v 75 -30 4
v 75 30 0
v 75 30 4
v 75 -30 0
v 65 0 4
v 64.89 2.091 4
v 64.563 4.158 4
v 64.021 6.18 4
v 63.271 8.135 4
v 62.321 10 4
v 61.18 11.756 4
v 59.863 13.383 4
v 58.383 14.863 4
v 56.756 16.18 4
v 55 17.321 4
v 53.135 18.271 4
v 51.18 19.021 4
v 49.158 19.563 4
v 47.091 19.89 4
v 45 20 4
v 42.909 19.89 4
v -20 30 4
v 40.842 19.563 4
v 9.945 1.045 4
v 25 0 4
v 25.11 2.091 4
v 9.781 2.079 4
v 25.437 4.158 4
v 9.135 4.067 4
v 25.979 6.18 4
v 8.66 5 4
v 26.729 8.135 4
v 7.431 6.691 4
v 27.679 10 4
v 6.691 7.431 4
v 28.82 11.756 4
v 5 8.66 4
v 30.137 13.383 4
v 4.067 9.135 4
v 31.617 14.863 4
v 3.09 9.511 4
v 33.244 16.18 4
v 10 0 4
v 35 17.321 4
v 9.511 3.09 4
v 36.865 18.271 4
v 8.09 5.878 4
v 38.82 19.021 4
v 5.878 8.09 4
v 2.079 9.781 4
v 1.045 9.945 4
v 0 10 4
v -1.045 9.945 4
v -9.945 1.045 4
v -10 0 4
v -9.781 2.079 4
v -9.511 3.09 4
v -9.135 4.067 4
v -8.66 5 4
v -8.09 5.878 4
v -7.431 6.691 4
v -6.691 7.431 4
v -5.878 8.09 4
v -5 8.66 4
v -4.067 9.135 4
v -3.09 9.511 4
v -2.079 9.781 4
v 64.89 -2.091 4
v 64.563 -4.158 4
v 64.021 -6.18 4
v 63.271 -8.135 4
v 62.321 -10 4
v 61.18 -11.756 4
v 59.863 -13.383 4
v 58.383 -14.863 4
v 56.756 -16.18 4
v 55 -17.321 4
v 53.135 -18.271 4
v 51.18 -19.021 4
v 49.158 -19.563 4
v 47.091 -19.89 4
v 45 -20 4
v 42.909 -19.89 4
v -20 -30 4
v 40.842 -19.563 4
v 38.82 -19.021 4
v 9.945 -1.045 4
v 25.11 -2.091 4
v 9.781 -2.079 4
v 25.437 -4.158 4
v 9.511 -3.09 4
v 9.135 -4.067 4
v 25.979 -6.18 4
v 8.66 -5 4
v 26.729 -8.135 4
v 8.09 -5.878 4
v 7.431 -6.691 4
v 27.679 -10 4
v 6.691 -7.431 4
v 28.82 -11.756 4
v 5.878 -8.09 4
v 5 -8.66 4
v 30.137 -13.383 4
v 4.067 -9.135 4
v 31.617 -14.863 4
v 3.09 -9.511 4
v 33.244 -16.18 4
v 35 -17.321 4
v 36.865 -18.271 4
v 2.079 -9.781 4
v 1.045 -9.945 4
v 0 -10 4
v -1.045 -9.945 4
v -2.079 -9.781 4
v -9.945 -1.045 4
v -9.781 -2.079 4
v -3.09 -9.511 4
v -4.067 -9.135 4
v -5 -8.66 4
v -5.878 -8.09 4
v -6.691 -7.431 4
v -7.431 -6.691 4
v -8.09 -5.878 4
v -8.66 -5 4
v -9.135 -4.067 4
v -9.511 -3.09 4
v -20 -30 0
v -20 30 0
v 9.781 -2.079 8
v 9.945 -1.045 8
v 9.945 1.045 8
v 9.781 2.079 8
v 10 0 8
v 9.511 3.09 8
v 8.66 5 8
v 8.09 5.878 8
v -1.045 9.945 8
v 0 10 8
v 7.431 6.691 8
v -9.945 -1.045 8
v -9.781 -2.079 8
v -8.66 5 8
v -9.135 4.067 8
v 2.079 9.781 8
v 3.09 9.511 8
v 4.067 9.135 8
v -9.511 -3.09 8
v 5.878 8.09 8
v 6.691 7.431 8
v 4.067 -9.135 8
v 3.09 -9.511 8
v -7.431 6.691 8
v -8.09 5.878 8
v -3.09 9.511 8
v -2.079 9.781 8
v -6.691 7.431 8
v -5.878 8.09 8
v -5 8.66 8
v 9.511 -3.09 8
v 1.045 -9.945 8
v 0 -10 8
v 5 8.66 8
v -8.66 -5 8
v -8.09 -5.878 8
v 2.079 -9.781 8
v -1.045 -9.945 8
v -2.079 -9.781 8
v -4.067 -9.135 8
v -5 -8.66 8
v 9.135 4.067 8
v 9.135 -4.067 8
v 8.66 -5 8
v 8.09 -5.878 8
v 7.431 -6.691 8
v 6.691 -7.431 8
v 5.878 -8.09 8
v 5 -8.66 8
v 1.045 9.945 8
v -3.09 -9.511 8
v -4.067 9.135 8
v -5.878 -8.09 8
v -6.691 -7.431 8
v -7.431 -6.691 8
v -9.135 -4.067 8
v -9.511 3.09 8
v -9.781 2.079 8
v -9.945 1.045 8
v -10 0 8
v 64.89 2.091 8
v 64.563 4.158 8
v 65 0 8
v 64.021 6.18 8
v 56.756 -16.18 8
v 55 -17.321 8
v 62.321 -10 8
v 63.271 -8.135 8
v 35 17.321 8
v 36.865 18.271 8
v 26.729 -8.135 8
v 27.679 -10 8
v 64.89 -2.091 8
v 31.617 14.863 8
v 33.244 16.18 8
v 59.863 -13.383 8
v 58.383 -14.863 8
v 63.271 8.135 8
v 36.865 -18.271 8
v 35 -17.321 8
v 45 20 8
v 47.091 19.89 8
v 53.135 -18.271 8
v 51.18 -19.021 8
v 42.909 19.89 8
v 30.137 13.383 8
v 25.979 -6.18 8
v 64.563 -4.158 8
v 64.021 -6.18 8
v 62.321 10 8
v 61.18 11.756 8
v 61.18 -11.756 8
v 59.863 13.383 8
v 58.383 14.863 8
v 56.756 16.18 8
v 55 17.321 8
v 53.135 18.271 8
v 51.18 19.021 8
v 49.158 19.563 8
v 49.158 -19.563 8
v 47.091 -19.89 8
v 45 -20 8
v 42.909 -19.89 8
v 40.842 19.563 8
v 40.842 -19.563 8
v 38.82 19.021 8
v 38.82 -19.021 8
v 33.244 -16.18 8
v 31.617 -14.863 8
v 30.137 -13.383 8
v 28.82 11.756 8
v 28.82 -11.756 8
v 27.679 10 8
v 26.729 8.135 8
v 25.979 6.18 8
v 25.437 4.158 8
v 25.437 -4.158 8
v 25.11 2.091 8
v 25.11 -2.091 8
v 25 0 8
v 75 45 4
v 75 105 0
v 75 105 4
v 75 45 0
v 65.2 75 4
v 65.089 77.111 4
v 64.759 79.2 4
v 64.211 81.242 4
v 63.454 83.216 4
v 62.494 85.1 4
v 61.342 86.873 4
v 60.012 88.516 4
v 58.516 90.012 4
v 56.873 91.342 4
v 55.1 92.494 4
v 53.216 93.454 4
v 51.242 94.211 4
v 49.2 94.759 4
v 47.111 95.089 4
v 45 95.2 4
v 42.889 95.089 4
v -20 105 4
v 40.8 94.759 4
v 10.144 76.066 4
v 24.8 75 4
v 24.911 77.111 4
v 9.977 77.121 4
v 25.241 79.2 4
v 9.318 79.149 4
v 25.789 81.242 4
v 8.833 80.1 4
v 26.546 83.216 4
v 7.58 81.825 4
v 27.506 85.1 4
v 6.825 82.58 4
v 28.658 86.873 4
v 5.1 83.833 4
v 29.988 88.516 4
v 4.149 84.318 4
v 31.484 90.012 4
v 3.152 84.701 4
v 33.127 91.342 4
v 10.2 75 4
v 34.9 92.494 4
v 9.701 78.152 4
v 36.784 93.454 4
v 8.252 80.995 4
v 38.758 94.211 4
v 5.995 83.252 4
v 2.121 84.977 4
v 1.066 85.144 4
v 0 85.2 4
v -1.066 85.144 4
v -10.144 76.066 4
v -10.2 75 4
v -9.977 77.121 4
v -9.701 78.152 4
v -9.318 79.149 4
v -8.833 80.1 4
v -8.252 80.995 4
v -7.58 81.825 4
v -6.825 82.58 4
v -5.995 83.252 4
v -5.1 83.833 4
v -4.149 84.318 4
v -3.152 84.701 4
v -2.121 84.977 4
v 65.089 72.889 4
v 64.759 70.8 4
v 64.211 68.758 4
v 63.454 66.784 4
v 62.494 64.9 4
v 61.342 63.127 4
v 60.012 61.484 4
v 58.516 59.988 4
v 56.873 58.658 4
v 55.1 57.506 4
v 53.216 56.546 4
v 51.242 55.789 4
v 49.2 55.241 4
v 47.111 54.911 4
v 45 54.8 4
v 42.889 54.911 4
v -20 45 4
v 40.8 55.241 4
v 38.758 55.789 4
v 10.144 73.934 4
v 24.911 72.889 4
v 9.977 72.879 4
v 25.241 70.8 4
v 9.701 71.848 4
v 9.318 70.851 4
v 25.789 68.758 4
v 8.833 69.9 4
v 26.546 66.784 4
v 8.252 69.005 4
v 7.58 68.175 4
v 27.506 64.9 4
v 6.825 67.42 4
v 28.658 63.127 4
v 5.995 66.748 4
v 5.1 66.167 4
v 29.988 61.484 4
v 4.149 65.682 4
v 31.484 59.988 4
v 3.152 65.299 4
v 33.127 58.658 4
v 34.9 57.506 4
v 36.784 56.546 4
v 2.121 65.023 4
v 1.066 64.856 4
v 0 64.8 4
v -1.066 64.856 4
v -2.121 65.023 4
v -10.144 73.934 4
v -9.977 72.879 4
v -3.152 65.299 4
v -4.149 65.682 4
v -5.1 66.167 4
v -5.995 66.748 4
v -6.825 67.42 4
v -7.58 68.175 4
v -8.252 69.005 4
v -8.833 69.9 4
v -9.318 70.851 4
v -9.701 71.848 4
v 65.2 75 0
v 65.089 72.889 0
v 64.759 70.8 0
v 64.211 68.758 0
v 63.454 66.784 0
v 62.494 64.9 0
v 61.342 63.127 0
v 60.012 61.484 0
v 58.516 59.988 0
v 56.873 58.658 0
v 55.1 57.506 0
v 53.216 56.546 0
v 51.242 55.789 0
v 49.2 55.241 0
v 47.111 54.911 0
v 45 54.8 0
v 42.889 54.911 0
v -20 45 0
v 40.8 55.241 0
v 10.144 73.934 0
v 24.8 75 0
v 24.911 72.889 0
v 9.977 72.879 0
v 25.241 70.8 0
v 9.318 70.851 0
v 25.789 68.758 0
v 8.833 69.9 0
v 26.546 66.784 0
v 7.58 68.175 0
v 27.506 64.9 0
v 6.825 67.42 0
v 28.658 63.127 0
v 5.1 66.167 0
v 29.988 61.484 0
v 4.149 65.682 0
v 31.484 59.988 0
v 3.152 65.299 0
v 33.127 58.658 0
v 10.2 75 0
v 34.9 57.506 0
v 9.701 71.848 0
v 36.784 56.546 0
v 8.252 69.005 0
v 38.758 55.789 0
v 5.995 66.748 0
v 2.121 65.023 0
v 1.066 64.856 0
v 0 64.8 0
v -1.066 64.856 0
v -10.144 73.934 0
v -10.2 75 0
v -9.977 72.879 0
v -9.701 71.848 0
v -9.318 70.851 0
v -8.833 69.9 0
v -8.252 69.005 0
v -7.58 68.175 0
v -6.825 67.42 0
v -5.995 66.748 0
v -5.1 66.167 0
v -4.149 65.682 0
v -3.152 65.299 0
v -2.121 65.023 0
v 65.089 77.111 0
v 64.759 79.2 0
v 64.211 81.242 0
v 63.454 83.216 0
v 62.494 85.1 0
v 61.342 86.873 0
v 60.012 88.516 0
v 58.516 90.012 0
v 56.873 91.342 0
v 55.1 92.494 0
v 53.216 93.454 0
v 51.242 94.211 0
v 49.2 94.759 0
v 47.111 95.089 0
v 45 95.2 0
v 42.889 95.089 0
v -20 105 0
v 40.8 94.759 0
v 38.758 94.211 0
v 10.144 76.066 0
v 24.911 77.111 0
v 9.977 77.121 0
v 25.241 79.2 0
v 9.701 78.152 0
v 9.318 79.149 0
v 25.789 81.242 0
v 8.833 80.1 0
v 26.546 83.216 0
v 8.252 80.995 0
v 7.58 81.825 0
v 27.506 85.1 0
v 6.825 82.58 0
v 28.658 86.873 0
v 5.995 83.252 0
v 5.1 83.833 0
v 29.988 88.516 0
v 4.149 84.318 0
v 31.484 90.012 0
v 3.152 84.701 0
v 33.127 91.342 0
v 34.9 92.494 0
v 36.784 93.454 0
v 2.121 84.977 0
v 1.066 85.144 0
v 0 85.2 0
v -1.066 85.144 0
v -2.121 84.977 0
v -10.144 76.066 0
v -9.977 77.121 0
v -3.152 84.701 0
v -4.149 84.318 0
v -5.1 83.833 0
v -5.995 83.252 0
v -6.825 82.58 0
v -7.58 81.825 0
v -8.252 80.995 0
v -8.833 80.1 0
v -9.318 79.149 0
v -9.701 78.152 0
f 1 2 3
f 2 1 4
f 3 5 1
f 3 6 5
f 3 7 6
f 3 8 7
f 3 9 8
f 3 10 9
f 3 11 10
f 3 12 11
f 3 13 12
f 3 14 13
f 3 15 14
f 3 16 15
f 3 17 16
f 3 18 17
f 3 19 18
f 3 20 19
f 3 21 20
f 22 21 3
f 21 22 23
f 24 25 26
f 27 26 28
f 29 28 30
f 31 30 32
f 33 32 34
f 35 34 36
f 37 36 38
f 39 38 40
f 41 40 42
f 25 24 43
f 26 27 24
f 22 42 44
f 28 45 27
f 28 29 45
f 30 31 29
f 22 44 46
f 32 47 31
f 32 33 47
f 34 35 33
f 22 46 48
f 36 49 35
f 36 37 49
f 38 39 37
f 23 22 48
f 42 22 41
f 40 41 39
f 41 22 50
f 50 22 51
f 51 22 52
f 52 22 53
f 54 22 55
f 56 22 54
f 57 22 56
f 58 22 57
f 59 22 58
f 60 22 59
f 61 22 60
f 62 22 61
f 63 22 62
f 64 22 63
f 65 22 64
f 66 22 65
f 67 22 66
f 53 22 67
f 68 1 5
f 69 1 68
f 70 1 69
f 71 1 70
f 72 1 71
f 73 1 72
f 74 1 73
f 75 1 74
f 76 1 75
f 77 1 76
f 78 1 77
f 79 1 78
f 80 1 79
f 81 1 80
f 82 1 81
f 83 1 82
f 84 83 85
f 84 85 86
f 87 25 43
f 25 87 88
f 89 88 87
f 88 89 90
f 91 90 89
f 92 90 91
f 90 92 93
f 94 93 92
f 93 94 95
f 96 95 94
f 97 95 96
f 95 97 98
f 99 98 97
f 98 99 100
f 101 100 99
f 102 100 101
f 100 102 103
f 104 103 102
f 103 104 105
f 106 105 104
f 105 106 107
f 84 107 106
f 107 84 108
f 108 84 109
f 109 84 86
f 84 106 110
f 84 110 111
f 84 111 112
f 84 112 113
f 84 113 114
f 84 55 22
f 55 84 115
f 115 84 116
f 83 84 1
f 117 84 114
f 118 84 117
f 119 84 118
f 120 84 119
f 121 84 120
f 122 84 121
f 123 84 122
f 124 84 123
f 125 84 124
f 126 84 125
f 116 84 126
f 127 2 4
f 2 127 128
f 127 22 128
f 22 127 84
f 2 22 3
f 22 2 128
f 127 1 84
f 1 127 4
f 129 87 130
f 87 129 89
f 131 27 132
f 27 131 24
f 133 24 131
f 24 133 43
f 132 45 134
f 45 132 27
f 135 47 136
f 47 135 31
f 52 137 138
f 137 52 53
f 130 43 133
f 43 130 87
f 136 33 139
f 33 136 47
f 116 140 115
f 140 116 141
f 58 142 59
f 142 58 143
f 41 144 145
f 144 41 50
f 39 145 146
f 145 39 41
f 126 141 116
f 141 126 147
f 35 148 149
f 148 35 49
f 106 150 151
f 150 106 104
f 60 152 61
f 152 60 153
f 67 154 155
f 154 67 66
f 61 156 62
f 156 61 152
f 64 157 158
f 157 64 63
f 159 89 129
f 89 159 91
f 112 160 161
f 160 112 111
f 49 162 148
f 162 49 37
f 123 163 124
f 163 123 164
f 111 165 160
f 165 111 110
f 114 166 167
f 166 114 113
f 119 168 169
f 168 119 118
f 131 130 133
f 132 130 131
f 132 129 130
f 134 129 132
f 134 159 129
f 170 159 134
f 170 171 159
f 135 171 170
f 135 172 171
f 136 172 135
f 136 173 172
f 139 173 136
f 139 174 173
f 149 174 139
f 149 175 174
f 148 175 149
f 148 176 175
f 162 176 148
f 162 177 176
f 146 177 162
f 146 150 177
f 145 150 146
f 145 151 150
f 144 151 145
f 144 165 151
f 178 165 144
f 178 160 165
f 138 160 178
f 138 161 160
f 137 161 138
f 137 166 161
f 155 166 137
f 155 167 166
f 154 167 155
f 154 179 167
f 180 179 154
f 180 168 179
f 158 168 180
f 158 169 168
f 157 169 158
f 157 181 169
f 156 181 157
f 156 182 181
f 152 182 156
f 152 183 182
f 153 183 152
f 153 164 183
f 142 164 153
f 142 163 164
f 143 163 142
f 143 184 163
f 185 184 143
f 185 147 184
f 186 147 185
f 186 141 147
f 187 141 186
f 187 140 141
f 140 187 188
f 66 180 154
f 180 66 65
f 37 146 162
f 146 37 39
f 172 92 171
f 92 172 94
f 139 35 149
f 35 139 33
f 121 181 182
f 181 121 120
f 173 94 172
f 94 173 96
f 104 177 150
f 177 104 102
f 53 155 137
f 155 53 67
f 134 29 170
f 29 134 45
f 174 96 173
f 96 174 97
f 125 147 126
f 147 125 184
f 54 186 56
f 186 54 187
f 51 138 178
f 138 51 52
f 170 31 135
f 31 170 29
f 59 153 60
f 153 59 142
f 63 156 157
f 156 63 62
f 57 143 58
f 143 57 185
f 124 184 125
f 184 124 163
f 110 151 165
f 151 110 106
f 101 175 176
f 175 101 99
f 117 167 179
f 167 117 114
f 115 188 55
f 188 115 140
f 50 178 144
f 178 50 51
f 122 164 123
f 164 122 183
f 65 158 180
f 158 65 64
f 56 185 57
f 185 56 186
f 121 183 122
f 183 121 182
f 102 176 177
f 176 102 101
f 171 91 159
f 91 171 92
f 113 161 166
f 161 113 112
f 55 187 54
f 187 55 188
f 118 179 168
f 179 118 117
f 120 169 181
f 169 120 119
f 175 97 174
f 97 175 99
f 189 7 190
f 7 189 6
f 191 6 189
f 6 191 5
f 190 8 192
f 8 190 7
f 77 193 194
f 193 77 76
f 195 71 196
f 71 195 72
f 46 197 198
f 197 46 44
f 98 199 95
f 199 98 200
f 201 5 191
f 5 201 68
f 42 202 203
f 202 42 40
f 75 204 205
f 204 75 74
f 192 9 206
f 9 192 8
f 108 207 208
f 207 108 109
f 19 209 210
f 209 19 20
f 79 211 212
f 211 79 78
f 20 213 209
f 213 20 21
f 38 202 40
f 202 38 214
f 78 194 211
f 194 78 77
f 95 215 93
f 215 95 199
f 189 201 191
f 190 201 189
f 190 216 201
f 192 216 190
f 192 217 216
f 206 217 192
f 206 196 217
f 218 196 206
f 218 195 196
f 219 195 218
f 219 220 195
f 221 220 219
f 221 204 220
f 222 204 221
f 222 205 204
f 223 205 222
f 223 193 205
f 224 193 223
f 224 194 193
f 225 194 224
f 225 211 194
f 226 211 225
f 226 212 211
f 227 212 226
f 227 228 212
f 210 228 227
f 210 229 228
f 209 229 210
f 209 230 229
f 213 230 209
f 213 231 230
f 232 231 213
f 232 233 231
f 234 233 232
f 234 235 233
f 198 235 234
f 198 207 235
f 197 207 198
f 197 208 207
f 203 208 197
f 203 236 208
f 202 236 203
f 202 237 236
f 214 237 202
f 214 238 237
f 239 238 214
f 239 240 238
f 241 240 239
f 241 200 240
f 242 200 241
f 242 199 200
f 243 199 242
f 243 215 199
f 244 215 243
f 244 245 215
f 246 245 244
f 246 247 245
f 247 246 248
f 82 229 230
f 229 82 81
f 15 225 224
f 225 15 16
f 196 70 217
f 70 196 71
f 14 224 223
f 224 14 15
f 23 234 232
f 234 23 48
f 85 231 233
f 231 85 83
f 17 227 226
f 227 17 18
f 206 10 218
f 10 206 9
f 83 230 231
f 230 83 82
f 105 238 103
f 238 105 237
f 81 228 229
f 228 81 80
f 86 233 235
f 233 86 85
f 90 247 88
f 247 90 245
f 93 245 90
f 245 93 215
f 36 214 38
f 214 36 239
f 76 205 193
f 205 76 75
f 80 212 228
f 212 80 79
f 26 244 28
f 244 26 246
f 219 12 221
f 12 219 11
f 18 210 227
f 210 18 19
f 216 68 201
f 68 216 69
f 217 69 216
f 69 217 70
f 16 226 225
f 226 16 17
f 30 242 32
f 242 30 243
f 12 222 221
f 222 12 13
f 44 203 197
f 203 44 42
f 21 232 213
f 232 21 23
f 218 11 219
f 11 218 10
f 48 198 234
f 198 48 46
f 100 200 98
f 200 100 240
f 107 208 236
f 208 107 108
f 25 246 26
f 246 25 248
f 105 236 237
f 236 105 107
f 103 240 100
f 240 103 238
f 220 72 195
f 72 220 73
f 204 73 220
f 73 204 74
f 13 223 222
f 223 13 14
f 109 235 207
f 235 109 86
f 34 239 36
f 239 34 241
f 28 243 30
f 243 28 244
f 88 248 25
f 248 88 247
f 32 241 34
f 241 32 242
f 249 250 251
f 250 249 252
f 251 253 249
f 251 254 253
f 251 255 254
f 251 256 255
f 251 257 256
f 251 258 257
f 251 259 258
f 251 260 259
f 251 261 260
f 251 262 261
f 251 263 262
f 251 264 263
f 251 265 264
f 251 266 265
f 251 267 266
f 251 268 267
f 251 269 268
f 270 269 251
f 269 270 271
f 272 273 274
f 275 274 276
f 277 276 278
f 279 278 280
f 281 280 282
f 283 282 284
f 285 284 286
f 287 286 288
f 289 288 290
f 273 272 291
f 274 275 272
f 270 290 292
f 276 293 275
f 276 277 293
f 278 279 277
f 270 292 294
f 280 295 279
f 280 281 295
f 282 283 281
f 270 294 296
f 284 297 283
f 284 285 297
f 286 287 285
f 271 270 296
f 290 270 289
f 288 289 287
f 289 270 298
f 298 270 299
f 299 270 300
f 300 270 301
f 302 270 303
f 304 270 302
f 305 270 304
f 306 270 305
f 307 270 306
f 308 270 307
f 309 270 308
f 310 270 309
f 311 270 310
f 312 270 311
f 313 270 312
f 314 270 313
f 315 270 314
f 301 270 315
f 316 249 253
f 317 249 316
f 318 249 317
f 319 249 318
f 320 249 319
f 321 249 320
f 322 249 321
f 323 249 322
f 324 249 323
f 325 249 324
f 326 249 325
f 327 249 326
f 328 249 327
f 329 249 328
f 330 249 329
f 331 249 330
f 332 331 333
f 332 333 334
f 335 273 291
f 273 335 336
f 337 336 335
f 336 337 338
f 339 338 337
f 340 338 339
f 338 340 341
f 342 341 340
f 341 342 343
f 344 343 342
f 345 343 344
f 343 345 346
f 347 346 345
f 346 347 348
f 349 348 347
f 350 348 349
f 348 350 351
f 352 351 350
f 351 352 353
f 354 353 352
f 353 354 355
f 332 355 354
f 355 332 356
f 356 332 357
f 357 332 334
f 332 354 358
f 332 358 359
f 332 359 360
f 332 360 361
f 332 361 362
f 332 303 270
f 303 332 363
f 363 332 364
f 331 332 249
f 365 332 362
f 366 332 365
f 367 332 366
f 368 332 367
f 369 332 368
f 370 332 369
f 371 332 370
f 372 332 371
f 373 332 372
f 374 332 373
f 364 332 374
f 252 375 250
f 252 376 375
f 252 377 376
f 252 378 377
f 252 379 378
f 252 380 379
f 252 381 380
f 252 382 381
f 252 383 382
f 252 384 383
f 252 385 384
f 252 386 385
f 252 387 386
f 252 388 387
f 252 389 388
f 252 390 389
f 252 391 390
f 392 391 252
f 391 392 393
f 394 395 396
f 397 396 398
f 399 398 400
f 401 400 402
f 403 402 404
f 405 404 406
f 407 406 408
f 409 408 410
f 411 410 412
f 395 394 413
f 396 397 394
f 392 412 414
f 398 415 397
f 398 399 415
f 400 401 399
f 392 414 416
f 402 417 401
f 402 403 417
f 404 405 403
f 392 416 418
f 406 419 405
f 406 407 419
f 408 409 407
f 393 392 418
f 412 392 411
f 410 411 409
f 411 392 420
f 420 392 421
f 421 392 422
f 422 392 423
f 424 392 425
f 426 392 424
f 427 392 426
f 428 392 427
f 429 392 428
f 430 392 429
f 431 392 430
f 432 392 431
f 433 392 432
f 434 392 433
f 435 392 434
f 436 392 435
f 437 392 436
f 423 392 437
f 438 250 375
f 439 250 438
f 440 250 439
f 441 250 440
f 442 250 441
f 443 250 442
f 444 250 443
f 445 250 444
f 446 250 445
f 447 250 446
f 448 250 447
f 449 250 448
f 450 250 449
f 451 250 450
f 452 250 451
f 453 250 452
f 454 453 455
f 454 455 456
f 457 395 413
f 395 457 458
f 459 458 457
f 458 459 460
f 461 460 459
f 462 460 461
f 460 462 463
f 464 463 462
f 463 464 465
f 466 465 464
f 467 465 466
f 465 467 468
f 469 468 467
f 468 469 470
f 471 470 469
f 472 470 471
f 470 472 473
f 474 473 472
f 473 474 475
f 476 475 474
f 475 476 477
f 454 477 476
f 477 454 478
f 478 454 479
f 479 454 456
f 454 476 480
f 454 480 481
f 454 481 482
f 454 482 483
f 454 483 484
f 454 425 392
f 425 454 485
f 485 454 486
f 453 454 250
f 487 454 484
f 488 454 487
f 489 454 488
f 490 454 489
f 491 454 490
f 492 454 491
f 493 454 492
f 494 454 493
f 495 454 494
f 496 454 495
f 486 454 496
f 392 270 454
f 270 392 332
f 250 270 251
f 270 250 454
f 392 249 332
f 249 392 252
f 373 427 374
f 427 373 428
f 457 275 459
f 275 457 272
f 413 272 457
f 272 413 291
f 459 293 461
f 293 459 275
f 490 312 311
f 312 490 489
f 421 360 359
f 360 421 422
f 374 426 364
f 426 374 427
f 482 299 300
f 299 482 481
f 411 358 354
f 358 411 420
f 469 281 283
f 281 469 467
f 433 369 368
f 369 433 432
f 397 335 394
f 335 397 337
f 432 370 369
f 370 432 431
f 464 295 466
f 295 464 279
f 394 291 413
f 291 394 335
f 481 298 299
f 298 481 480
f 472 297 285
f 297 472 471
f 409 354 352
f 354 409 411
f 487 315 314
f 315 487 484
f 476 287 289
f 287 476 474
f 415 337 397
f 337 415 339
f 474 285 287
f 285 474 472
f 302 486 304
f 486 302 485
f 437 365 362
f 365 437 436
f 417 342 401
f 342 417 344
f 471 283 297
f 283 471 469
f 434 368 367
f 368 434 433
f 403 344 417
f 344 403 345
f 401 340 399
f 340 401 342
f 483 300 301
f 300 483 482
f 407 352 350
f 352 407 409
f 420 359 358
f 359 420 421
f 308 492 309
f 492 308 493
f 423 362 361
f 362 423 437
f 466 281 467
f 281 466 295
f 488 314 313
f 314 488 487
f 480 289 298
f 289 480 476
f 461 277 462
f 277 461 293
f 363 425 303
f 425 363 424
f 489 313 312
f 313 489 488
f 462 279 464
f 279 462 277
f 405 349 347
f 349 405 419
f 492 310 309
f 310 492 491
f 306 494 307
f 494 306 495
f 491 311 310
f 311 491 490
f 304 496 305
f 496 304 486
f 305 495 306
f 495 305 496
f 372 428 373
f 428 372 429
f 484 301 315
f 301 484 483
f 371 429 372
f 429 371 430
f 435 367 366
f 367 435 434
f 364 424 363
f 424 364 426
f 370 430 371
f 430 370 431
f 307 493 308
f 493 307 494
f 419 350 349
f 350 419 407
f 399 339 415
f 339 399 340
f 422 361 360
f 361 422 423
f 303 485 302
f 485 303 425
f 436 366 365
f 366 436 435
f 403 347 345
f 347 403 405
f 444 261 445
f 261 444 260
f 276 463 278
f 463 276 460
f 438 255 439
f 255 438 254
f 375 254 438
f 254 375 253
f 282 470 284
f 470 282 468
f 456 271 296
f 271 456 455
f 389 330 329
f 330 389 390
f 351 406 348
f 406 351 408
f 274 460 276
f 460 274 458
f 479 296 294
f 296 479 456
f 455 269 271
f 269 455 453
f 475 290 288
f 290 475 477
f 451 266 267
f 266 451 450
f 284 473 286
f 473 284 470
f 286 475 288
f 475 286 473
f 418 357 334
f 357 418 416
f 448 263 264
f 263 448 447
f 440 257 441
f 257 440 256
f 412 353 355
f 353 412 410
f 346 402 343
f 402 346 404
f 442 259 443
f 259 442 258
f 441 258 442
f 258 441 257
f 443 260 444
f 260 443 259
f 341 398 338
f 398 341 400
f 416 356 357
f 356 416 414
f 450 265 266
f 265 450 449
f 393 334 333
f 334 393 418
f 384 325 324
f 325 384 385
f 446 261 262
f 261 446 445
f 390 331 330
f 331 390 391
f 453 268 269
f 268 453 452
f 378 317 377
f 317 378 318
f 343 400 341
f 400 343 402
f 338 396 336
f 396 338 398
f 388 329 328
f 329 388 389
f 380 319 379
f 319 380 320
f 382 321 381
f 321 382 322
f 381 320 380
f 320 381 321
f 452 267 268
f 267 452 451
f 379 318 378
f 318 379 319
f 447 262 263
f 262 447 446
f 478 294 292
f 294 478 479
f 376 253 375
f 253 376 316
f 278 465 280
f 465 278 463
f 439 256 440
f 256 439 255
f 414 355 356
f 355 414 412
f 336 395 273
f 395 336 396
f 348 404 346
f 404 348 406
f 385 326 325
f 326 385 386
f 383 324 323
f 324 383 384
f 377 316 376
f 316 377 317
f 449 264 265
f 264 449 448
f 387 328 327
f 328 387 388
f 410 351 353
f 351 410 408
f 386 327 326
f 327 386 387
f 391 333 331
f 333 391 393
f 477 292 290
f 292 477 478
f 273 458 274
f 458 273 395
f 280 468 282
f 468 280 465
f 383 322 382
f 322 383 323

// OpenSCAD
$fn=60;
$clearance=0.2;
union() {
	translate([-20, -30]) cube([95, 60, 4]);
	cylinder(h=8, r=10);
	translate([45, 0]) cylinder(h=8, r=20);
}
translate([0, 75])
	difference() {
		translate([-20, -30]) cube([95, 60, 4]);
		translate([0, 0, -1]) cylinder(h=6, r=10+$clearance);
		translate([45, 0, -1]) cylinder(h=6, r=20+$clearance);
	}
